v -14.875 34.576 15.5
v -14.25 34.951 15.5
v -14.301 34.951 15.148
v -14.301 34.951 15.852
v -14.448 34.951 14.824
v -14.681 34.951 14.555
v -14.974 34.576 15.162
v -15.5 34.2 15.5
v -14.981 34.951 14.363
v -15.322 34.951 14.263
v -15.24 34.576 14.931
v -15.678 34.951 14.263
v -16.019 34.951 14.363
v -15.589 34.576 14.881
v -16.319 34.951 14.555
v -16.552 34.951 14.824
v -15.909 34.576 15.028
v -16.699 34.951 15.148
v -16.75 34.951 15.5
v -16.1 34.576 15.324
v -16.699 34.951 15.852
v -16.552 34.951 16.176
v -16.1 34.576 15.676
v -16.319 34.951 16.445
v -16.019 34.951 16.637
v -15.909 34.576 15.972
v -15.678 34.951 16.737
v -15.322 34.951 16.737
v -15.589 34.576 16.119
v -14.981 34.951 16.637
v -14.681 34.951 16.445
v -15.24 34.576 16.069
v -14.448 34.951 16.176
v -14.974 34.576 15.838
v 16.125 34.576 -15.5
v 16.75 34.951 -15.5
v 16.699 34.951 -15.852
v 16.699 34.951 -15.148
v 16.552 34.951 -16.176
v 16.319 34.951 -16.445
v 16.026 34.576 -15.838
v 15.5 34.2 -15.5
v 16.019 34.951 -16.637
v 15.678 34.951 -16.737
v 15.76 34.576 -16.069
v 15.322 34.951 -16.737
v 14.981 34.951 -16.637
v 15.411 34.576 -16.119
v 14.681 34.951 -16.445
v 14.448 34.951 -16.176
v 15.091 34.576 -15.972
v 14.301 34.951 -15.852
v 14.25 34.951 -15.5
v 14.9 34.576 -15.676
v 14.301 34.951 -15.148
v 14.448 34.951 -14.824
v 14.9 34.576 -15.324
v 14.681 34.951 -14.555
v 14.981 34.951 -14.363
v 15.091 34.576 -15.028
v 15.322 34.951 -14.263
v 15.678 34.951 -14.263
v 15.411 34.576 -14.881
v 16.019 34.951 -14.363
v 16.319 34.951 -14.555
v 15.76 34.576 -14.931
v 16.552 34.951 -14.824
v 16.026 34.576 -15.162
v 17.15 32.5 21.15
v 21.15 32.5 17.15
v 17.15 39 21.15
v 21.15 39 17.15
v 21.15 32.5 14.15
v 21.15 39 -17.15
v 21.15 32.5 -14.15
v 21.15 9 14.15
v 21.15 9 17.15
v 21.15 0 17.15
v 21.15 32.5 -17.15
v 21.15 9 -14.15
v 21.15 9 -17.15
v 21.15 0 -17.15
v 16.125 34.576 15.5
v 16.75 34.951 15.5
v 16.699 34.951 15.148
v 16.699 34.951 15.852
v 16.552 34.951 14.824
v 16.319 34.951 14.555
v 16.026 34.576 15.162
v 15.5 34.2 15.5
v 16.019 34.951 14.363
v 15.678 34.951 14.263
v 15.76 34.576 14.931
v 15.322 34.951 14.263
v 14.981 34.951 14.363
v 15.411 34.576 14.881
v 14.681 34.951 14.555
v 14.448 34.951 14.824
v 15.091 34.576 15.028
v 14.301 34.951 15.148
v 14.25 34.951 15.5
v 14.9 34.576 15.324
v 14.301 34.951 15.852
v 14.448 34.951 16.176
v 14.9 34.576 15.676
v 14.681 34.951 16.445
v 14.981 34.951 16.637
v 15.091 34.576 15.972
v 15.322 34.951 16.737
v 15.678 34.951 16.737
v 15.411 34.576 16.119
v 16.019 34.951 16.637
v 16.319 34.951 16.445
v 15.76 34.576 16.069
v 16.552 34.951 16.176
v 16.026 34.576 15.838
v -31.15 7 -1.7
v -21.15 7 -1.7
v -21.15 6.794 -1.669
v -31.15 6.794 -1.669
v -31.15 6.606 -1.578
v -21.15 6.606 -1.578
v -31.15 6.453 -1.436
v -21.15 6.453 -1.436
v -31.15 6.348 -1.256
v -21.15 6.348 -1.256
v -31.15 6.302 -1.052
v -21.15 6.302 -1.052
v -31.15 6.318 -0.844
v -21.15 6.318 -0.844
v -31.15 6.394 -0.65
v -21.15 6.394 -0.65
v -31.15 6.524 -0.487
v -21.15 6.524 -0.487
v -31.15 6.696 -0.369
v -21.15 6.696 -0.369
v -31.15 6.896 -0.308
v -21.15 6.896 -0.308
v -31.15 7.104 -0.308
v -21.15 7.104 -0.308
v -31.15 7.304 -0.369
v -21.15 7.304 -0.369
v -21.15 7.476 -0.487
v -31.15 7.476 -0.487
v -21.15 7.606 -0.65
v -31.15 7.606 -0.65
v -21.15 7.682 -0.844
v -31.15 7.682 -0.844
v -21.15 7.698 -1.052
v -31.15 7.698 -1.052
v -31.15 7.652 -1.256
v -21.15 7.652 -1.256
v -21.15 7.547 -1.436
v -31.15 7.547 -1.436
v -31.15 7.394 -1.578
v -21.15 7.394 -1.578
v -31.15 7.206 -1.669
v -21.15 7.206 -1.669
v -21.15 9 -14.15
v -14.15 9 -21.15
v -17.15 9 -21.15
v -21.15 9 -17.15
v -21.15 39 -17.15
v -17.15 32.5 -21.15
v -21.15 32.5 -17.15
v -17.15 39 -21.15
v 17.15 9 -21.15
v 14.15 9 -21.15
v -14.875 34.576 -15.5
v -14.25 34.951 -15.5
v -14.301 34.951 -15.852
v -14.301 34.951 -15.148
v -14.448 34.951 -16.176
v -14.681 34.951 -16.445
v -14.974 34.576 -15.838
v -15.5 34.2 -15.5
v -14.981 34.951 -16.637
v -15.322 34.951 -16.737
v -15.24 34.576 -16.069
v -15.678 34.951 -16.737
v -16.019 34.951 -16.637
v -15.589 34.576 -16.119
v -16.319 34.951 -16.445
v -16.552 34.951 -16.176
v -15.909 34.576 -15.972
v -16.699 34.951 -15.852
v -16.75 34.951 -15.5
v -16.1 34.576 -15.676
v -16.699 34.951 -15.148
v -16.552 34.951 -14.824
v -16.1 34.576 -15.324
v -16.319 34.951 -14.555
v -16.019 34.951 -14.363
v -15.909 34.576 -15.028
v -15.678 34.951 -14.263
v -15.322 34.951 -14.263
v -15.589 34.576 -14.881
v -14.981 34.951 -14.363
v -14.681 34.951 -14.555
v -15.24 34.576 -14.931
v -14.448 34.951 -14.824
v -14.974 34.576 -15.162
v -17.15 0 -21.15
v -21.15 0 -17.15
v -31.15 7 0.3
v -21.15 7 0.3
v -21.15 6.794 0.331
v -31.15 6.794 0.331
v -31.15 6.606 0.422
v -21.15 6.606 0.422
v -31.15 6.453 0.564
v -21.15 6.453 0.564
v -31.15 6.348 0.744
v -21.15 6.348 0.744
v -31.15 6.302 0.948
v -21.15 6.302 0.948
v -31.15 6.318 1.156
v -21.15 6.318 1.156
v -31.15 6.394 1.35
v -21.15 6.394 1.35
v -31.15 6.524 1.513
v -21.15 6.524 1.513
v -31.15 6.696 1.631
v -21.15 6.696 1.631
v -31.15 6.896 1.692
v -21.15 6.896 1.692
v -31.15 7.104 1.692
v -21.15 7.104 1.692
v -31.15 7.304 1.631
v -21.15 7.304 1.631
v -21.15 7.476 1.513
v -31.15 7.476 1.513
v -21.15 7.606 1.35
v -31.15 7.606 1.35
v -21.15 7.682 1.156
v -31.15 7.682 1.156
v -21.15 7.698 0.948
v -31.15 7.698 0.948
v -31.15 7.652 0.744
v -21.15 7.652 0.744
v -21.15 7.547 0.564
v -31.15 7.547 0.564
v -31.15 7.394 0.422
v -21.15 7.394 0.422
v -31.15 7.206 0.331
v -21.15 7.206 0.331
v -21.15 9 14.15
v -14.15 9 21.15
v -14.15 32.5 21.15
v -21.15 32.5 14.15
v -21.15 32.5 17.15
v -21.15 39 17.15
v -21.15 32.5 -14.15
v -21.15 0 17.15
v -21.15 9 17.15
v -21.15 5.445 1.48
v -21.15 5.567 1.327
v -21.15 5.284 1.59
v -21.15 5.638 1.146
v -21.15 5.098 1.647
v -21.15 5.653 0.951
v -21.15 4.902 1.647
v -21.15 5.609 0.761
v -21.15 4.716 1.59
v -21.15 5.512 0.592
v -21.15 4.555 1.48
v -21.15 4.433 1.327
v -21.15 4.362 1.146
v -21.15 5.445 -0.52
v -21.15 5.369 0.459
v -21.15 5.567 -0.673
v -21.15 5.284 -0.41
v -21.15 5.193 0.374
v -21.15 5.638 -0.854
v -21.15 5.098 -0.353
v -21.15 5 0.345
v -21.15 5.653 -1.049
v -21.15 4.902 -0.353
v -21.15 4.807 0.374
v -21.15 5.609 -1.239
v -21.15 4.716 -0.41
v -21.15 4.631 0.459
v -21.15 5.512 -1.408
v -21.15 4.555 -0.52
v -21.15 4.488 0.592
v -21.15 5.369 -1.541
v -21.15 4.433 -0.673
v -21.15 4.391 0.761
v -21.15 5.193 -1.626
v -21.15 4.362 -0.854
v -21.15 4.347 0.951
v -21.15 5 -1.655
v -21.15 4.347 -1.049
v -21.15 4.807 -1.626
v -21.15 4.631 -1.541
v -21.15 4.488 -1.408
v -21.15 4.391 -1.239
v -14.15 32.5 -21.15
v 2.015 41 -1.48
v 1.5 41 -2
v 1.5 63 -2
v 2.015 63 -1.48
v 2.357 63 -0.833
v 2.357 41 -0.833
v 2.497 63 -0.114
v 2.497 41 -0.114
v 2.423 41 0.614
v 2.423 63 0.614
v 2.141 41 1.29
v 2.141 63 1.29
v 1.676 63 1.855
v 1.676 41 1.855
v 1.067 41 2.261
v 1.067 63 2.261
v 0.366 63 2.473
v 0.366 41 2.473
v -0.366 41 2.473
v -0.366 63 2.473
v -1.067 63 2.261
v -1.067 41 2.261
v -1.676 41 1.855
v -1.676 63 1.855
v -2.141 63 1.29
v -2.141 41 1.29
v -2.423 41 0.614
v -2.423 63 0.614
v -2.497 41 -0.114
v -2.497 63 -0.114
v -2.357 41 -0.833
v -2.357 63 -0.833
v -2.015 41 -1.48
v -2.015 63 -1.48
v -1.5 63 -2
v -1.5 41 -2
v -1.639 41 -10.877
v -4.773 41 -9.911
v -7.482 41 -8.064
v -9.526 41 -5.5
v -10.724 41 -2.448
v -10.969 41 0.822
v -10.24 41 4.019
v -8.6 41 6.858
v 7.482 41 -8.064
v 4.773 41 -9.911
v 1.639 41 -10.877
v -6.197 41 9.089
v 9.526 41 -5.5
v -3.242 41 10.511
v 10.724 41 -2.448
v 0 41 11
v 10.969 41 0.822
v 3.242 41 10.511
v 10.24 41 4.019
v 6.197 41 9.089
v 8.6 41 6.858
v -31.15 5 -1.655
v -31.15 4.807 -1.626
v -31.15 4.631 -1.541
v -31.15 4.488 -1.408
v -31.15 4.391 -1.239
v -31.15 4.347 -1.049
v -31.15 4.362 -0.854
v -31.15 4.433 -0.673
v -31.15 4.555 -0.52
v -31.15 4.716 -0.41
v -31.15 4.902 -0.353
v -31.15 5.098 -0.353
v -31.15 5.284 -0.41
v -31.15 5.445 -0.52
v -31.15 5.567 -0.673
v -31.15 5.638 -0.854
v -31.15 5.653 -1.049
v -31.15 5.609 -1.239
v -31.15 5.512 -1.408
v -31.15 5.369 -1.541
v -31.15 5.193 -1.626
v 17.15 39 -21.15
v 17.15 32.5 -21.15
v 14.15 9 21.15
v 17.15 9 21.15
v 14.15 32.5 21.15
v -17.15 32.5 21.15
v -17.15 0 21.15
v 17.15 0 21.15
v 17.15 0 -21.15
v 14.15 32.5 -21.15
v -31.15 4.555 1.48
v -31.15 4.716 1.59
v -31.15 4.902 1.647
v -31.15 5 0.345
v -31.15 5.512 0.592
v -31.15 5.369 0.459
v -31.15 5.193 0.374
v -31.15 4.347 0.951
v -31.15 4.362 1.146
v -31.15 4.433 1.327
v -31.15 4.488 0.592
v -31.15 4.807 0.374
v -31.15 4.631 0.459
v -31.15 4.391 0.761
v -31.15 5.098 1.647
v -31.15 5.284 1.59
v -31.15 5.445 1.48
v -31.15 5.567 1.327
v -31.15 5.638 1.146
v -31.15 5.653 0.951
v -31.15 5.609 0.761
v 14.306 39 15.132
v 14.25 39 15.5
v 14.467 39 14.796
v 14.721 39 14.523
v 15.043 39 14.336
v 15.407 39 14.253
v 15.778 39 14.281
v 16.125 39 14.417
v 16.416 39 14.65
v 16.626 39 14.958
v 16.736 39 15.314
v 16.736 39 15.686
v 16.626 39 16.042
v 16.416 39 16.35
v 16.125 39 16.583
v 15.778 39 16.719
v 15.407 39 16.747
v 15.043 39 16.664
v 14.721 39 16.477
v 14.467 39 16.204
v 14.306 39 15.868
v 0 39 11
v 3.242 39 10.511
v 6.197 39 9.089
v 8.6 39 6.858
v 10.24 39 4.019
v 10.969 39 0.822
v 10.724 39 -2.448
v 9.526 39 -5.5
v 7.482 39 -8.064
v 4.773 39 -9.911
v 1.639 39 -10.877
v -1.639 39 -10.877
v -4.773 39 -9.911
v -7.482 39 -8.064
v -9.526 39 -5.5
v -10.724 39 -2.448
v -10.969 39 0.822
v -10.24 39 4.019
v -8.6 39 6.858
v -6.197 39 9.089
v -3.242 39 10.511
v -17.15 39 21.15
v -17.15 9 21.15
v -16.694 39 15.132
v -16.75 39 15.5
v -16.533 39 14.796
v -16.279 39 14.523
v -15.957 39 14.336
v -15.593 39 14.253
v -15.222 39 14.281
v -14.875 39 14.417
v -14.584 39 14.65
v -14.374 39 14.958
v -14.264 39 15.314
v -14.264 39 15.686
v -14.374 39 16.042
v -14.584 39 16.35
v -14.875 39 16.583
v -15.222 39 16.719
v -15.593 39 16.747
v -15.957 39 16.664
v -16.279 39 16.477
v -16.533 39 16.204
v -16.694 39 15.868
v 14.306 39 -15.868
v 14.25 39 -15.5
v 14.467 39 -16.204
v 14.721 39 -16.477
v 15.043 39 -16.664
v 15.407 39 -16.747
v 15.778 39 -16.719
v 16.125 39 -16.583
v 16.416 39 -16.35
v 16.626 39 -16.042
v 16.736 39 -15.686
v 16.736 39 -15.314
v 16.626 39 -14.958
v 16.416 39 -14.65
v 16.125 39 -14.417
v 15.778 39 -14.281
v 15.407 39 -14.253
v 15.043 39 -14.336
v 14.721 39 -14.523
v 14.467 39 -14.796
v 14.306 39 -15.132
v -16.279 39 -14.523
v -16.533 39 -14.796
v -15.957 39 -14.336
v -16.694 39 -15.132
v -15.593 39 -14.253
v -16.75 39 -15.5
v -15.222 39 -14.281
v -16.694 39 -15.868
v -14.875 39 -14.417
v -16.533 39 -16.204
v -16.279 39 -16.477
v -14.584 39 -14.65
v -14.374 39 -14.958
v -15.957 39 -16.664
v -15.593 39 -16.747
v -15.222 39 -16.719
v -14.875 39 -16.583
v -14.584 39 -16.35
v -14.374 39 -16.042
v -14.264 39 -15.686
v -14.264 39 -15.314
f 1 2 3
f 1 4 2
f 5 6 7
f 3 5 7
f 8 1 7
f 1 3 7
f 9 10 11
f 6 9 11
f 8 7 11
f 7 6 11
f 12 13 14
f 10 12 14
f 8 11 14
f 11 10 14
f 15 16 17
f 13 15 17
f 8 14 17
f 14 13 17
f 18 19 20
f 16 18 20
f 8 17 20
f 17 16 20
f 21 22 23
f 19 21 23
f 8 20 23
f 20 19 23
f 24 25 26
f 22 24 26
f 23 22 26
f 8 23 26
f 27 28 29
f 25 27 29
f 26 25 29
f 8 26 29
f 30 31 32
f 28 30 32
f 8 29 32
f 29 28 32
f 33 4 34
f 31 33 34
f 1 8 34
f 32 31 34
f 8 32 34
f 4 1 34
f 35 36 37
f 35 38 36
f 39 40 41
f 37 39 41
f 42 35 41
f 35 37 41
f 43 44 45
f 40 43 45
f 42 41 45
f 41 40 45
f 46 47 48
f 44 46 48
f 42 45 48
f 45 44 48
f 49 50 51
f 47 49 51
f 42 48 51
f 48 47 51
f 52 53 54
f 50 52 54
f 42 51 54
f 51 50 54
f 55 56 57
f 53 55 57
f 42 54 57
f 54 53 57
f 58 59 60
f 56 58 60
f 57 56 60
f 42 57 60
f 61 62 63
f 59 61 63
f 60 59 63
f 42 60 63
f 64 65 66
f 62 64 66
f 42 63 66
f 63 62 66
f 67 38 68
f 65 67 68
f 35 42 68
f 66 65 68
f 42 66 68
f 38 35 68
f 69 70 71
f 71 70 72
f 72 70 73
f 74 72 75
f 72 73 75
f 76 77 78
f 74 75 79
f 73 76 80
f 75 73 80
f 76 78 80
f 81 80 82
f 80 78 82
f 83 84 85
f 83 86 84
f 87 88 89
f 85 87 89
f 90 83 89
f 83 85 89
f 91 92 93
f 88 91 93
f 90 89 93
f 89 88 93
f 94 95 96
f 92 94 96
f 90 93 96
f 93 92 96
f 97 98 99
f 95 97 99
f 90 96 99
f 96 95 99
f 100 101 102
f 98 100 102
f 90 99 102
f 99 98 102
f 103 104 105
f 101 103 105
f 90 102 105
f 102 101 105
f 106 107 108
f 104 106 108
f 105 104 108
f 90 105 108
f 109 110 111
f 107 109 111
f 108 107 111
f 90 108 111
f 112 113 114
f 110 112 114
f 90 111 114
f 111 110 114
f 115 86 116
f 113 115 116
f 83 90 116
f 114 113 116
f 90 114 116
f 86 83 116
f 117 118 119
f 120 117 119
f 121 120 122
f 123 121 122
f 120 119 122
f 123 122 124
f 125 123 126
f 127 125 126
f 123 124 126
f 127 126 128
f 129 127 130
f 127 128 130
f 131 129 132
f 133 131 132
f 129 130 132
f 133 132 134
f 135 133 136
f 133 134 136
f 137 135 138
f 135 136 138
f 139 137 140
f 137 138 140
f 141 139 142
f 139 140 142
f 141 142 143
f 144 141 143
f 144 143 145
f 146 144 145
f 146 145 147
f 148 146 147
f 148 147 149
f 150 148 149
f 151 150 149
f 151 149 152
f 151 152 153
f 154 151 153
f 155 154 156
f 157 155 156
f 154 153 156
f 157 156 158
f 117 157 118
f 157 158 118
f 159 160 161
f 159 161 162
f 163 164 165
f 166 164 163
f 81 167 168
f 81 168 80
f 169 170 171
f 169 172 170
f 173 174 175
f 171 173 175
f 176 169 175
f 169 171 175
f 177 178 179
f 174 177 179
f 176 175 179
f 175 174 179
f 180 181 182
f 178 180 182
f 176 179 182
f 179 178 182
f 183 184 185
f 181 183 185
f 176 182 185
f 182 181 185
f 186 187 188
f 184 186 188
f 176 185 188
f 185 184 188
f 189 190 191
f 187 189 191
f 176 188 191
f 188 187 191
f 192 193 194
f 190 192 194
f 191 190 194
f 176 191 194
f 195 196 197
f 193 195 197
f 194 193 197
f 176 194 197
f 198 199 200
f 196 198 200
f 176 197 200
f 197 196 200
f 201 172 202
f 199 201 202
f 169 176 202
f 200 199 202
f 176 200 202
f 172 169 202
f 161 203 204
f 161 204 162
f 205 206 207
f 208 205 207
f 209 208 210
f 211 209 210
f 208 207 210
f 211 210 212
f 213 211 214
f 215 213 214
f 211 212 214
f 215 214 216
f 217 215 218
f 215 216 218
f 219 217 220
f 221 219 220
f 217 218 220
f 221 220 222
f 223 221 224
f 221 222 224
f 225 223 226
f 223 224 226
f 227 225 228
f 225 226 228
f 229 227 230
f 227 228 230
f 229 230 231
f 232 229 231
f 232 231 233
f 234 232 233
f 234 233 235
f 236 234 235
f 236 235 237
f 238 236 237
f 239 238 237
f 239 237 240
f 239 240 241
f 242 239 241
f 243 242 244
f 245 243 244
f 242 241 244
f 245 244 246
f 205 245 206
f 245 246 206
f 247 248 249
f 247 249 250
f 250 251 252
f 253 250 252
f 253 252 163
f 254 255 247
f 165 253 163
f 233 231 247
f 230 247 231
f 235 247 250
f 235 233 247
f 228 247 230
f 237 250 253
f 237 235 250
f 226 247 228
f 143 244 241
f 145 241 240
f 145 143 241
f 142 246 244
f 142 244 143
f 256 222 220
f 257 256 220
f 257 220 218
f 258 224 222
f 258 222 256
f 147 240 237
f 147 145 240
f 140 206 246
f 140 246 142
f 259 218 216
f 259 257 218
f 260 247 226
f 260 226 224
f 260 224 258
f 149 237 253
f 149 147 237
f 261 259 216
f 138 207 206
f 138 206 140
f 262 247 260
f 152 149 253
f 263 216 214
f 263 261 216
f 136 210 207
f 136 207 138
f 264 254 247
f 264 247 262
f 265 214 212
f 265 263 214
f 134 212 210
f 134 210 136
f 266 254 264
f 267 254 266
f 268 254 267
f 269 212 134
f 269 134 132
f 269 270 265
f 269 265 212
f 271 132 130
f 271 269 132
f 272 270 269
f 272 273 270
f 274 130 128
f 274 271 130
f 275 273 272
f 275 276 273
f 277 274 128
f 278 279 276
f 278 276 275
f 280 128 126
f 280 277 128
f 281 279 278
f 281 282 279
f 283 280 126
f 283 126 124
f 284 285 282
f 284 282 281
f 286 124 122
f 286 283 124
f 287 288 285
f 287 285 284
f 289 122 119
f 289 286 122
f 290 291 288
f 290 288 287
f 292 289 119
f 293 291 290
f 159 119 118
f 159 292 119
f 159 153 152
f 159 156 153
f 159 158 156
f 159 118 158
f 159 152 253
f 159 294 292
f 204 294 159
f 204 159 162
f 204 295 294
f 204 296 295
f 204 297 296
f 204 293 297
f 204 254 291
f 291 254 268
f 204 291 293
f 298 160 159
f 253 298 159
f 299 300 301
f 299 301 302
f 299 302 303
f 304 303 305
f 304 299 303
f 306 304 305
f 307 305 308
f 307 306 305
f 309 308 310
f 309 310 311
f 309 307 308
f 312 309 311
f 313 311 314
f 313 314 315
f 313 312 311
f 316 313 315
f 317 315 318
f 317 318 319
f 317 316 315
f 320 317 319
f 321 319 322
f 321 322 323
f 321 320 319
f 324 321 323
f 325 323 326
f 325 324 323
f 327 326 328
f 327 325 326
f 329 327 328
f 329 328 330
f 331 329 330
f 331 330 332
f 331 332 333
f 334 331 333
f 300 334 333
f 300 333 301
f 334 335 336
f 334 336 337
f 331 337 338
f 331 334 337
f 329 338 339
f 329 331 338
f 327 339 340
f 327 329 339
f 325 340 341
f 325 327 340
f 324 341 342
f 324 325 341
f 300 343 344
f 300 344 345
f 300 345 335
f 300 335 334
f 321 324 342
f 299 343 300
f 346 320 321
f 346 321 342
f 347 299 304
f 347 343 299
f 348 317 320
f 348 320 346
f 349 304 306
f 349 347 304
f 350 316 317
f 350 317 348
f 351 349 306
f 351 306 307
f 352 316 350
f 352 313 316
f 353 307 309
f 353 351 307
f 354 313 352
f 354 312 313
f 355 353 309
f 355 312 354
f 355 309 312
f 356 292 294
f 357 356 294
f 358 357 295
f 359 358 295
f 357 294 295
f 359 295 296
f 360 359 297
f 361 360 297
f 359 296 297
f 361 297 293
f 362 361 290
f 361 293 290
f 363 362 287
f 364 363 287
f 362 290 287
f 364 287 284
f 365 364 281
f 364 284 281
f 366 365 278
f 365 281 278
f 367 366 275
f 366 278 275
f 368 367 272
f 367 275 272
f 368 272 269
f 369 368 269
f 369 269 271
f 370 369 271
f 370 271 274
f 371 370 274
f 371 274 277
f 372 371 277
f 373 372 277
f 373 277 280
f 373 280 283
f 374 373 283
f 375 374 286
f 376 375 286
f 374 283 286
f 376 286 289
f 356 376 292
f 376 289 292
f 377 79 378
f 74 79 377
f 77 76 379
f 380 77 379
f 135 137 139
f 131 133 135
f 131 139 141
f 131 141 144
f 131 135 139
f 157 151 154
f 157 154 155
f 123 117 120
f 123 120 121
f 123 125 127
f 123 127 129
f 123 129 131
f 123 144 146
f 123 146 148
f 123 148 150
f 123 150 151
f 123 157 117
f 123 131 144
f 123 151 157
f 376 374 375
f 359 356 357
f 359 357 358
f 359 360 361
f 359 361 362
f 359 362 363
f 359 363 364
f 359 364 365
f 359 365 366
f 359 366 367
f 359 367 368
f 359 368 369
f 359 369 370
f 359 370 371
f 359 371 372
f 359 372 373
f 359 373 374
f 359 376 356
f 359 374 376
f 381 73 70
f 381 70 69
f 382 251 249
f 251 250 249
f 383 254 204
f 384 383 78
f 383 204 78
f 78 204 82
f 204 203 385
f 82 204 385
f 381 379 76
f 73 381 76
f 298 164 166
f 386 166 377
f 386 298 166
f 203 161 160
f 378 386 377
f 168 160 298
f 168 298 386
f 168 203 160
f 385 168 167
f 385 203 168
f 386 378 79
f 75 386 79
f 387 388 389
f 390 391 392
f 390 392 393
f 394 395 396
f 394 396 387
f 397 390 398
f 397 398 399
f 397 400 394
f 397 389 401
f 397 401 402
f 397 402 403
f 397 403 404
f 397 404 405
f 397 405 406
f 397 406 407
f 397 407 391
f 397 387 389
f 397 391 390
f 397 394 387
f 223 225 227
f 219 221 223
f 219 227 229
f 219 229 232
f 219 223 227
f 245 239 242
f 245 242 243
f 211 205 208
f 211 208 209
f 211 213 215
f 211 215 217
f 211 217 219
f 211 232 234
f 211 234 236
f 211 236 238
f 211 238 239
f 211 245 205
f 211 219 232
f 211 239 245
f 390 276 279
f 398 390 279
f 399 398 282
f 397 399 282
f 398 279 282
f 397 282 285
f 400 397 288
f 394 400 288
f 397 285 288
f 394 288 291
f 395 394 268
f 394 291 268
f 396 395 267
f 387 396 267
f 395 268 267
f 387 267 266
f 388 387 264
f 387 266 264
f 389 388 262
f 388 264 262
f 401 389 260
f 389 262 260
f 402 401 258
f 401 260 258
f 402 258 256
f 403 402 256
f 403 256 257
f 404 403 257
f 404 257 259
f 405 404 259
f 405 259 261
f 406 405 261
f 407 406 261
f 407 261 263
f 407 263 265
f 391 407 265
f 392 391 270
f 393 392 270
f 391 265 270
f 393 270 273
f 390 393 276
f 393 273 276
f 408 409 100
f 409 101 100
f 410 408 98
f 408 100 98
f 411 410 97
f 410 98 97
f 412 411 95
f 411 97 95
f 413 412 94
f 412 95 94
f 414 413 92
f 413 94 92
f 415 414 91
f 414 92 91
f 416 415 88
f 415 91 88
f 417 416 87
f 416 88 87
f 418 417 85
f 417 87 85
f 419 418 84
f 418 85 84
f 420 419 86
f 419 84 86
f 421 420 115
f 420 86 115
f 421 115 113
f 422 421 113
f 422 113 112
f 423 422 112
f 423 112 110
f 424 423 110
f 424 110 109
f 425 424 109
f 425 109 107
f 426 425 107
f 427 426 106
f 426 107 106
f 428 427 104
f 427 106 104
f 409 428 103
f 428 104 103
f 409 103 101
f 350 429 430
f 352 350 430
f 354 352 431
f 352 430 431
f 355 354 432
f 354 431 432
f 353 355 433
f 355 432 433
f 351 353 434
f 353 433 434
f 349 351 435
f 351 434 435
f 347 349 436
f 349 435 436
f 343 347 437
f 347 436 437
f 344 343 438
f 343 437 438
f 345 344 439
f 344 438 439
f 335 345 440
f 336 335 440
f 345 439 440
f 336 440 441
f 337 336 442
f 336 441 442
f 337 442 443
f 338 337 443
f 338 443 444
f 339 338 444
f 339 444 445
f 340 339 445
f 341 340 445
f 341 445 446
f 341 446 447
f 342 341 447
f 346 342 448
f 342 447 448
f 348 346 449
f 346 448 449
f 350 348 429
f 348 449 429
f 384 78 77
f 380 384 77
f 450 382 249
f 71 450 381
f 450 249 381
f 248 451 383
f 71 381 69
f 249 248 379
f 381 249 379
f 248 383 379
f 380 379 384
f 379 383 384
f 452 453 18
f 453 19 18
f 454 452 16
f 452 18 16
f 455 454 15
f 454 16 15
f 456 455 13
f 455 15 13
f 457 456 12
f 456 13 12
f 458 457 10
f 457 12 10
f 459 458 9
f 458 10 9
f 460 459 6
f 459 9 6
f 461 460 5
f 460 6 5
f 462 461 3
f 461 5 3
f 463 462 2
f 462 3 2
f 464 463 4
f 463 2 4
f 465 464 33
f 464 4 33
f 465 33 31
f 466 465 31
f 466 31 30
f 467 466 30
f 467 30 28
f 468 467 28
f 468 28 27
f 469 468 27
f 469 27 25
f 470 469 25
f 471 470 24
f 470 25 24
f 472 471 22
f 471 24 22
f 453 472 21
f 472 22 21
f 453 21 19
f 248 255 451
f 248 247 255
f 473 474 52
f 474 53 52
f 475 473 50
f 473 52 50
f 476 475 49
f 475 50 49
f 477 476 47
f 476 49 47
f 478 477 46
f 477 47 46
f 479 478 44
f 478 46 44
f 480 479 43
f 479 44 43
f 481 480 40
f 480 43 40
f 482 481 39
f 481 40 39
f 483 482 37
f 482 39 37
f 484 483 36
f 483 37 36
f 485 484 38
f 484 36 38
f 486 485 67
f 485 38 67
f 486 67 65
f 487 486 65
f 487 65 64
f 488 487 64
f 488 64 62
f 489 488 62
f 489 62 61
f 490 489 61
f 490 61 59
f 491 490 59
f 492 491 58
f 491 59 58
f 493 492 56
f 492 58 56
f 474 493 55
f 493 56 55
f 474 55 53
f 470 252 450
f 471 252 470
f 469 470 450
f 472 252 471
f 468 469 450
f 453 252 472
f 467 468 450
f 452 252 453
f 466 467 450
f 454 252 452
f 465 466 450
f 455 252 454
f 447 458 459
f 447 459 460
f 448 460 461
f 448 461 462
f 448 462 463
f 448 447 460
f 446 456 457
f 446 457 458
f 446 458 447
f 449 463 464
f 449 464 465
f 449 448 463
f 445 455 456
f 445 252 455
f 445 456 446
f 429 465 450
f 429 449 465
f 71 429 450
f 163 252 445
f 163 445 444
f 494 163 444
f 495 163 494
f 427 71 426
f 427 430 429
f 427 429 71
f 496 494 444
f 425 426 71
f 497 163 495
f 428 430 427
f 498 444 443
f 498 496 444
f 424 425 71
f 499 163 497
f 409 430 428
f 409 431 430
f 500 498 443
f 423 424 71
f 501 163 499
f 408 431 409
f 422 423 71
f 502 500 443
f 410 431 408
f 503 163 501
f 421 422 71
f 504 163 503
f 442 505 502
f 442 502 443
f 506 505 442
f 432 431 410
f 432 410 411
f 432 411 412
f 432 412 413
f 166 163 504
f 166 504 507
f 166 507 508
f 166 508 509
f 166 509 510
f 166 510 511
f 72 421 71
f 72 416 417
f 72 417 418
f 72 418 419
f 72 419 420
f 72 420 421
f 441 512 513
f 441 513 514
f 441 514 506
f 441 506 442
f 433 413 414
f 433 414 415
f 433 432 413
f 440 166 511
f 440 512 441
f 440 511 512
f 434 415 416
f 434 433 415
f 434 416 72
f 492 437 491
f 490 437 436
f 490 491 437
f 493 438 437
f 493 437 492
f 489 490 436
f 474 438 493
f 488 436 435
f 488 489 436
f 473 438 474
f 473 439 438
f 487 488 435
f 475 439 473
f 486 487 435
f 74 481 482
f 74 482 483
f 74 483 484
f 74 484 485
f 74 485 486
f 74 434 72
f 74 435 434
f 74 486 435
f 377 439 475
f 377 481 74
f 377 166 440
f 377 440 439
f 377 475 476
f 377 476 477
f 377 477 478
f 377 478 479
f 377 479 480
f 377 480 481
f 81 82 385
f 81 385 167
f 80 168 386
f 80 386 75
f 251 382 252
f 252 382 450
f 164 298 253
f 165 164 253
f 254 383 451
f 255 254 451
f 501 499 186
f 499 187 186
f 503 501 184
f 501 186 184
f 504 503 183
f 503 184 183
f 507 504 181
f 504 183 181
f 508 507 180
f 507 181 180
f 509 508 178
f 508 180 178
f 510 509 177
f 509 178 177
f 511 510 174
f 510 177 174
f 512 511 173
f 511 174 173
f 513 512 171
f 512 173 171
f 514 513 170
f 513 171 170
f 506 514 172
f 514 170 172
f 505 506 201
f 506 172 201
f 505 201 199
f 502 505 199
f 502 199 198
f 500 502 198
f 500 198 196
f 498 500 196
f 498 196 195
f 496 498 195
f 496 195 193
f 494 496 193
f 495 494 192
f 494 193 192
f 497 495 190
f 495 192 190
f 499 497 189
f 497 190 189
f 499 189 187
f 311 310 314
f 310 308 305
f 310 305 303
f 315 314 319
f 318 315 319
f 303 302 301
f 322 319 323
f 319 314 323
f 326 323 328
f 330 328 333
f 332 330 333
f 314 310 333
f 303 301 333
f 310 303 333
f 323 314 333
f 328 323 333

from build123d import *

# Parameters (mm, degrees)
ESQUISSE1_W                                   = 42.3
ESQUISSE1_H                                   = 42.3
BOSS_EXTRU_1_DEPTH                            = 39
ESQUISSE2_R                                   = 11
BOSS_EXTRU_2_DEPTH                            = 2
BOSS_EXTRU_3_DEPTH                            = 22
TROU_POUR_TARAUDAGE_POUR_TROU_TARAUD_M3_D     = 2.5
TROU_POUR_TARAUDAGE_POUR_TROU_TARAUD_M3_DEPTH = 4.048924226
TROU_POUR_TARAUDAGE_POUR_TROU_TARAUD_M3_TIP   = 0.751075774
CHANFREIN1_SIZE                               = 4
ENL_V_START                                   = 9
ENL_V_MAT_EXTRU_1_DEPTH                       = 23.5
ESQUISSE5_R                                   = 0.7
ESQUISSE5_R_2                                 = 0.654723083
BOSS_EXTRU_4_DEPTH                            = 10


with BuildPart() as part:
    # Esquisse1 → Boss.-Extru.1 (new body)
    with BuildSketch(Plane(origin=(0, 0, 0), x_dir=(1, 0, 0), z_dir=(0, 1, 0))):
        Rectangle(ESQUISSE1_W, ESQUISSE1_H)
    extrude(amount=BOSS_EXTRU_1_DEPTH)

    # Esquisse2 → Boss.-Extru.2 (add)
    with BuildSketch(Plane(origin=(0, 39, 0), x_dir=(1, 0, 0), z_dir=(0, 1, 0))):
        with Locations(Location((0, 0, 0), (0, 0, 270))):
            Circle(ESQUISSE2_R)
    extrude(amount=BOSS_EXTRU_2_DEPTH)

    # Esquisse3 → Boss.-Extru.3 (add)
    with BuildSketch(Plane(origin=(0, 41, 0), x_dir=(1, 0, 0), z_dir=(0, 1, 0))):
        with BuildLine():
            Line((-1.5, 2), (1.5, 2))
            ThreePointArc((1.5, 2), (0, -2.5), (-1.5, 2))
        make_face()
    extrude(amount=BOSS_EXTRU_3_DEPTH)

    # Trou pour taraudage pour trou taraudé M31
    with Locations(Plane(origin=(0, 39, 0), x_dir=(1, 0, 0), z_dir=(0, 1, 0))):
        with Locations((-15.5, 15.5), (15.5, 15.5), (15.5, -15.5), (-15.5, -15.5)):
            Hole(TROU_POUR_TARAUDAGE_POUR_TROU_TARAUD_M3_D / 2, depth=TROU_POUR_TARAUDAGE_POUR_TROU_TARAUD_M3_DEPTH)
            with Locations((0, 0, -(TROU_POUR_TARAUDAGE_POUR_TROU_TARAUD_M3_DEPTH + TROU_POUR_TARAUDAGE_POUR_TROU_TARAUD_M3_TIP / 2))):  # 118° drill point
                Cone(0, TROU_POUR_TARAUDAGE_POUR_TROU_TARAUD_M3_D / 2, TROU_POUR_TARAUDAGE_POUR_TROU_TARAUD_M3_TIP, mode=Mode.SUBTRACT)

    # Chanfrein1
    chanfrein1_edges = [part.edges().sort_by_distance(p)[0] for p in [
        (-21.15, 19.5, -21.15),
        (21.15, 19.5, -21.15),
        (21.15, 19.5, 21.15),
        (-21.15, 19.5, 21.15),
    ]]
    chamfer(chanfrein1_edges, length=CHANFREIN1_SIZE)

    # Esquisse4 → Enlèv. mat.-Extru.1 (cut)
    with BuildSketch(Plane(origin=(0, 0, 0), x_dir=(1, 0, 0), z_dir=(0, 1, 0)).offset(ENL_V_START)):
        Polygon((-14.15, 21.15), (-21.15, 14.15), (-21.15, 21.15), align=None)
        Polygon((21.15, 21.15), (14.15, 21.15), (21.15, 14.15), align=None)
        Polygon((14.15, -21.15), (21.15, -14.15), (21.15, -21.15), align=None)
        Polygon((-21.15, -21.15), (-14.15, -21.15), (-21.15, -14.15), align=None)
    extrude(amount=ENL_V_MAT_EXTRU_1_DEPTH, mode=Mode.SUBTRACT)

    # Esquisse5 → Boss.-Extru.4 (add)
    with BuildSketch(Plane.ZY.offset(21.15)):
        with Locations(Location((-1, 7, 0), (0, 0, 180))):
            Circle(ESQUISSE5_R)
        with Locations(Location((-1, 5, 0), (0, 0, 180))):
            Circle(ESQUISSE5_R_2)
        with Locations(Location((1, 5, 0), (0, 0, 180))):
            Circle(ESQUISSE5_R_2)
        with Locations(Location((1, 7, 0), (0, 0, 180))):
            Circle(ESQUISSE5_R)
    extrude(amount=BOSS_EXTRU_4_DEPTH)


solid = part.part
